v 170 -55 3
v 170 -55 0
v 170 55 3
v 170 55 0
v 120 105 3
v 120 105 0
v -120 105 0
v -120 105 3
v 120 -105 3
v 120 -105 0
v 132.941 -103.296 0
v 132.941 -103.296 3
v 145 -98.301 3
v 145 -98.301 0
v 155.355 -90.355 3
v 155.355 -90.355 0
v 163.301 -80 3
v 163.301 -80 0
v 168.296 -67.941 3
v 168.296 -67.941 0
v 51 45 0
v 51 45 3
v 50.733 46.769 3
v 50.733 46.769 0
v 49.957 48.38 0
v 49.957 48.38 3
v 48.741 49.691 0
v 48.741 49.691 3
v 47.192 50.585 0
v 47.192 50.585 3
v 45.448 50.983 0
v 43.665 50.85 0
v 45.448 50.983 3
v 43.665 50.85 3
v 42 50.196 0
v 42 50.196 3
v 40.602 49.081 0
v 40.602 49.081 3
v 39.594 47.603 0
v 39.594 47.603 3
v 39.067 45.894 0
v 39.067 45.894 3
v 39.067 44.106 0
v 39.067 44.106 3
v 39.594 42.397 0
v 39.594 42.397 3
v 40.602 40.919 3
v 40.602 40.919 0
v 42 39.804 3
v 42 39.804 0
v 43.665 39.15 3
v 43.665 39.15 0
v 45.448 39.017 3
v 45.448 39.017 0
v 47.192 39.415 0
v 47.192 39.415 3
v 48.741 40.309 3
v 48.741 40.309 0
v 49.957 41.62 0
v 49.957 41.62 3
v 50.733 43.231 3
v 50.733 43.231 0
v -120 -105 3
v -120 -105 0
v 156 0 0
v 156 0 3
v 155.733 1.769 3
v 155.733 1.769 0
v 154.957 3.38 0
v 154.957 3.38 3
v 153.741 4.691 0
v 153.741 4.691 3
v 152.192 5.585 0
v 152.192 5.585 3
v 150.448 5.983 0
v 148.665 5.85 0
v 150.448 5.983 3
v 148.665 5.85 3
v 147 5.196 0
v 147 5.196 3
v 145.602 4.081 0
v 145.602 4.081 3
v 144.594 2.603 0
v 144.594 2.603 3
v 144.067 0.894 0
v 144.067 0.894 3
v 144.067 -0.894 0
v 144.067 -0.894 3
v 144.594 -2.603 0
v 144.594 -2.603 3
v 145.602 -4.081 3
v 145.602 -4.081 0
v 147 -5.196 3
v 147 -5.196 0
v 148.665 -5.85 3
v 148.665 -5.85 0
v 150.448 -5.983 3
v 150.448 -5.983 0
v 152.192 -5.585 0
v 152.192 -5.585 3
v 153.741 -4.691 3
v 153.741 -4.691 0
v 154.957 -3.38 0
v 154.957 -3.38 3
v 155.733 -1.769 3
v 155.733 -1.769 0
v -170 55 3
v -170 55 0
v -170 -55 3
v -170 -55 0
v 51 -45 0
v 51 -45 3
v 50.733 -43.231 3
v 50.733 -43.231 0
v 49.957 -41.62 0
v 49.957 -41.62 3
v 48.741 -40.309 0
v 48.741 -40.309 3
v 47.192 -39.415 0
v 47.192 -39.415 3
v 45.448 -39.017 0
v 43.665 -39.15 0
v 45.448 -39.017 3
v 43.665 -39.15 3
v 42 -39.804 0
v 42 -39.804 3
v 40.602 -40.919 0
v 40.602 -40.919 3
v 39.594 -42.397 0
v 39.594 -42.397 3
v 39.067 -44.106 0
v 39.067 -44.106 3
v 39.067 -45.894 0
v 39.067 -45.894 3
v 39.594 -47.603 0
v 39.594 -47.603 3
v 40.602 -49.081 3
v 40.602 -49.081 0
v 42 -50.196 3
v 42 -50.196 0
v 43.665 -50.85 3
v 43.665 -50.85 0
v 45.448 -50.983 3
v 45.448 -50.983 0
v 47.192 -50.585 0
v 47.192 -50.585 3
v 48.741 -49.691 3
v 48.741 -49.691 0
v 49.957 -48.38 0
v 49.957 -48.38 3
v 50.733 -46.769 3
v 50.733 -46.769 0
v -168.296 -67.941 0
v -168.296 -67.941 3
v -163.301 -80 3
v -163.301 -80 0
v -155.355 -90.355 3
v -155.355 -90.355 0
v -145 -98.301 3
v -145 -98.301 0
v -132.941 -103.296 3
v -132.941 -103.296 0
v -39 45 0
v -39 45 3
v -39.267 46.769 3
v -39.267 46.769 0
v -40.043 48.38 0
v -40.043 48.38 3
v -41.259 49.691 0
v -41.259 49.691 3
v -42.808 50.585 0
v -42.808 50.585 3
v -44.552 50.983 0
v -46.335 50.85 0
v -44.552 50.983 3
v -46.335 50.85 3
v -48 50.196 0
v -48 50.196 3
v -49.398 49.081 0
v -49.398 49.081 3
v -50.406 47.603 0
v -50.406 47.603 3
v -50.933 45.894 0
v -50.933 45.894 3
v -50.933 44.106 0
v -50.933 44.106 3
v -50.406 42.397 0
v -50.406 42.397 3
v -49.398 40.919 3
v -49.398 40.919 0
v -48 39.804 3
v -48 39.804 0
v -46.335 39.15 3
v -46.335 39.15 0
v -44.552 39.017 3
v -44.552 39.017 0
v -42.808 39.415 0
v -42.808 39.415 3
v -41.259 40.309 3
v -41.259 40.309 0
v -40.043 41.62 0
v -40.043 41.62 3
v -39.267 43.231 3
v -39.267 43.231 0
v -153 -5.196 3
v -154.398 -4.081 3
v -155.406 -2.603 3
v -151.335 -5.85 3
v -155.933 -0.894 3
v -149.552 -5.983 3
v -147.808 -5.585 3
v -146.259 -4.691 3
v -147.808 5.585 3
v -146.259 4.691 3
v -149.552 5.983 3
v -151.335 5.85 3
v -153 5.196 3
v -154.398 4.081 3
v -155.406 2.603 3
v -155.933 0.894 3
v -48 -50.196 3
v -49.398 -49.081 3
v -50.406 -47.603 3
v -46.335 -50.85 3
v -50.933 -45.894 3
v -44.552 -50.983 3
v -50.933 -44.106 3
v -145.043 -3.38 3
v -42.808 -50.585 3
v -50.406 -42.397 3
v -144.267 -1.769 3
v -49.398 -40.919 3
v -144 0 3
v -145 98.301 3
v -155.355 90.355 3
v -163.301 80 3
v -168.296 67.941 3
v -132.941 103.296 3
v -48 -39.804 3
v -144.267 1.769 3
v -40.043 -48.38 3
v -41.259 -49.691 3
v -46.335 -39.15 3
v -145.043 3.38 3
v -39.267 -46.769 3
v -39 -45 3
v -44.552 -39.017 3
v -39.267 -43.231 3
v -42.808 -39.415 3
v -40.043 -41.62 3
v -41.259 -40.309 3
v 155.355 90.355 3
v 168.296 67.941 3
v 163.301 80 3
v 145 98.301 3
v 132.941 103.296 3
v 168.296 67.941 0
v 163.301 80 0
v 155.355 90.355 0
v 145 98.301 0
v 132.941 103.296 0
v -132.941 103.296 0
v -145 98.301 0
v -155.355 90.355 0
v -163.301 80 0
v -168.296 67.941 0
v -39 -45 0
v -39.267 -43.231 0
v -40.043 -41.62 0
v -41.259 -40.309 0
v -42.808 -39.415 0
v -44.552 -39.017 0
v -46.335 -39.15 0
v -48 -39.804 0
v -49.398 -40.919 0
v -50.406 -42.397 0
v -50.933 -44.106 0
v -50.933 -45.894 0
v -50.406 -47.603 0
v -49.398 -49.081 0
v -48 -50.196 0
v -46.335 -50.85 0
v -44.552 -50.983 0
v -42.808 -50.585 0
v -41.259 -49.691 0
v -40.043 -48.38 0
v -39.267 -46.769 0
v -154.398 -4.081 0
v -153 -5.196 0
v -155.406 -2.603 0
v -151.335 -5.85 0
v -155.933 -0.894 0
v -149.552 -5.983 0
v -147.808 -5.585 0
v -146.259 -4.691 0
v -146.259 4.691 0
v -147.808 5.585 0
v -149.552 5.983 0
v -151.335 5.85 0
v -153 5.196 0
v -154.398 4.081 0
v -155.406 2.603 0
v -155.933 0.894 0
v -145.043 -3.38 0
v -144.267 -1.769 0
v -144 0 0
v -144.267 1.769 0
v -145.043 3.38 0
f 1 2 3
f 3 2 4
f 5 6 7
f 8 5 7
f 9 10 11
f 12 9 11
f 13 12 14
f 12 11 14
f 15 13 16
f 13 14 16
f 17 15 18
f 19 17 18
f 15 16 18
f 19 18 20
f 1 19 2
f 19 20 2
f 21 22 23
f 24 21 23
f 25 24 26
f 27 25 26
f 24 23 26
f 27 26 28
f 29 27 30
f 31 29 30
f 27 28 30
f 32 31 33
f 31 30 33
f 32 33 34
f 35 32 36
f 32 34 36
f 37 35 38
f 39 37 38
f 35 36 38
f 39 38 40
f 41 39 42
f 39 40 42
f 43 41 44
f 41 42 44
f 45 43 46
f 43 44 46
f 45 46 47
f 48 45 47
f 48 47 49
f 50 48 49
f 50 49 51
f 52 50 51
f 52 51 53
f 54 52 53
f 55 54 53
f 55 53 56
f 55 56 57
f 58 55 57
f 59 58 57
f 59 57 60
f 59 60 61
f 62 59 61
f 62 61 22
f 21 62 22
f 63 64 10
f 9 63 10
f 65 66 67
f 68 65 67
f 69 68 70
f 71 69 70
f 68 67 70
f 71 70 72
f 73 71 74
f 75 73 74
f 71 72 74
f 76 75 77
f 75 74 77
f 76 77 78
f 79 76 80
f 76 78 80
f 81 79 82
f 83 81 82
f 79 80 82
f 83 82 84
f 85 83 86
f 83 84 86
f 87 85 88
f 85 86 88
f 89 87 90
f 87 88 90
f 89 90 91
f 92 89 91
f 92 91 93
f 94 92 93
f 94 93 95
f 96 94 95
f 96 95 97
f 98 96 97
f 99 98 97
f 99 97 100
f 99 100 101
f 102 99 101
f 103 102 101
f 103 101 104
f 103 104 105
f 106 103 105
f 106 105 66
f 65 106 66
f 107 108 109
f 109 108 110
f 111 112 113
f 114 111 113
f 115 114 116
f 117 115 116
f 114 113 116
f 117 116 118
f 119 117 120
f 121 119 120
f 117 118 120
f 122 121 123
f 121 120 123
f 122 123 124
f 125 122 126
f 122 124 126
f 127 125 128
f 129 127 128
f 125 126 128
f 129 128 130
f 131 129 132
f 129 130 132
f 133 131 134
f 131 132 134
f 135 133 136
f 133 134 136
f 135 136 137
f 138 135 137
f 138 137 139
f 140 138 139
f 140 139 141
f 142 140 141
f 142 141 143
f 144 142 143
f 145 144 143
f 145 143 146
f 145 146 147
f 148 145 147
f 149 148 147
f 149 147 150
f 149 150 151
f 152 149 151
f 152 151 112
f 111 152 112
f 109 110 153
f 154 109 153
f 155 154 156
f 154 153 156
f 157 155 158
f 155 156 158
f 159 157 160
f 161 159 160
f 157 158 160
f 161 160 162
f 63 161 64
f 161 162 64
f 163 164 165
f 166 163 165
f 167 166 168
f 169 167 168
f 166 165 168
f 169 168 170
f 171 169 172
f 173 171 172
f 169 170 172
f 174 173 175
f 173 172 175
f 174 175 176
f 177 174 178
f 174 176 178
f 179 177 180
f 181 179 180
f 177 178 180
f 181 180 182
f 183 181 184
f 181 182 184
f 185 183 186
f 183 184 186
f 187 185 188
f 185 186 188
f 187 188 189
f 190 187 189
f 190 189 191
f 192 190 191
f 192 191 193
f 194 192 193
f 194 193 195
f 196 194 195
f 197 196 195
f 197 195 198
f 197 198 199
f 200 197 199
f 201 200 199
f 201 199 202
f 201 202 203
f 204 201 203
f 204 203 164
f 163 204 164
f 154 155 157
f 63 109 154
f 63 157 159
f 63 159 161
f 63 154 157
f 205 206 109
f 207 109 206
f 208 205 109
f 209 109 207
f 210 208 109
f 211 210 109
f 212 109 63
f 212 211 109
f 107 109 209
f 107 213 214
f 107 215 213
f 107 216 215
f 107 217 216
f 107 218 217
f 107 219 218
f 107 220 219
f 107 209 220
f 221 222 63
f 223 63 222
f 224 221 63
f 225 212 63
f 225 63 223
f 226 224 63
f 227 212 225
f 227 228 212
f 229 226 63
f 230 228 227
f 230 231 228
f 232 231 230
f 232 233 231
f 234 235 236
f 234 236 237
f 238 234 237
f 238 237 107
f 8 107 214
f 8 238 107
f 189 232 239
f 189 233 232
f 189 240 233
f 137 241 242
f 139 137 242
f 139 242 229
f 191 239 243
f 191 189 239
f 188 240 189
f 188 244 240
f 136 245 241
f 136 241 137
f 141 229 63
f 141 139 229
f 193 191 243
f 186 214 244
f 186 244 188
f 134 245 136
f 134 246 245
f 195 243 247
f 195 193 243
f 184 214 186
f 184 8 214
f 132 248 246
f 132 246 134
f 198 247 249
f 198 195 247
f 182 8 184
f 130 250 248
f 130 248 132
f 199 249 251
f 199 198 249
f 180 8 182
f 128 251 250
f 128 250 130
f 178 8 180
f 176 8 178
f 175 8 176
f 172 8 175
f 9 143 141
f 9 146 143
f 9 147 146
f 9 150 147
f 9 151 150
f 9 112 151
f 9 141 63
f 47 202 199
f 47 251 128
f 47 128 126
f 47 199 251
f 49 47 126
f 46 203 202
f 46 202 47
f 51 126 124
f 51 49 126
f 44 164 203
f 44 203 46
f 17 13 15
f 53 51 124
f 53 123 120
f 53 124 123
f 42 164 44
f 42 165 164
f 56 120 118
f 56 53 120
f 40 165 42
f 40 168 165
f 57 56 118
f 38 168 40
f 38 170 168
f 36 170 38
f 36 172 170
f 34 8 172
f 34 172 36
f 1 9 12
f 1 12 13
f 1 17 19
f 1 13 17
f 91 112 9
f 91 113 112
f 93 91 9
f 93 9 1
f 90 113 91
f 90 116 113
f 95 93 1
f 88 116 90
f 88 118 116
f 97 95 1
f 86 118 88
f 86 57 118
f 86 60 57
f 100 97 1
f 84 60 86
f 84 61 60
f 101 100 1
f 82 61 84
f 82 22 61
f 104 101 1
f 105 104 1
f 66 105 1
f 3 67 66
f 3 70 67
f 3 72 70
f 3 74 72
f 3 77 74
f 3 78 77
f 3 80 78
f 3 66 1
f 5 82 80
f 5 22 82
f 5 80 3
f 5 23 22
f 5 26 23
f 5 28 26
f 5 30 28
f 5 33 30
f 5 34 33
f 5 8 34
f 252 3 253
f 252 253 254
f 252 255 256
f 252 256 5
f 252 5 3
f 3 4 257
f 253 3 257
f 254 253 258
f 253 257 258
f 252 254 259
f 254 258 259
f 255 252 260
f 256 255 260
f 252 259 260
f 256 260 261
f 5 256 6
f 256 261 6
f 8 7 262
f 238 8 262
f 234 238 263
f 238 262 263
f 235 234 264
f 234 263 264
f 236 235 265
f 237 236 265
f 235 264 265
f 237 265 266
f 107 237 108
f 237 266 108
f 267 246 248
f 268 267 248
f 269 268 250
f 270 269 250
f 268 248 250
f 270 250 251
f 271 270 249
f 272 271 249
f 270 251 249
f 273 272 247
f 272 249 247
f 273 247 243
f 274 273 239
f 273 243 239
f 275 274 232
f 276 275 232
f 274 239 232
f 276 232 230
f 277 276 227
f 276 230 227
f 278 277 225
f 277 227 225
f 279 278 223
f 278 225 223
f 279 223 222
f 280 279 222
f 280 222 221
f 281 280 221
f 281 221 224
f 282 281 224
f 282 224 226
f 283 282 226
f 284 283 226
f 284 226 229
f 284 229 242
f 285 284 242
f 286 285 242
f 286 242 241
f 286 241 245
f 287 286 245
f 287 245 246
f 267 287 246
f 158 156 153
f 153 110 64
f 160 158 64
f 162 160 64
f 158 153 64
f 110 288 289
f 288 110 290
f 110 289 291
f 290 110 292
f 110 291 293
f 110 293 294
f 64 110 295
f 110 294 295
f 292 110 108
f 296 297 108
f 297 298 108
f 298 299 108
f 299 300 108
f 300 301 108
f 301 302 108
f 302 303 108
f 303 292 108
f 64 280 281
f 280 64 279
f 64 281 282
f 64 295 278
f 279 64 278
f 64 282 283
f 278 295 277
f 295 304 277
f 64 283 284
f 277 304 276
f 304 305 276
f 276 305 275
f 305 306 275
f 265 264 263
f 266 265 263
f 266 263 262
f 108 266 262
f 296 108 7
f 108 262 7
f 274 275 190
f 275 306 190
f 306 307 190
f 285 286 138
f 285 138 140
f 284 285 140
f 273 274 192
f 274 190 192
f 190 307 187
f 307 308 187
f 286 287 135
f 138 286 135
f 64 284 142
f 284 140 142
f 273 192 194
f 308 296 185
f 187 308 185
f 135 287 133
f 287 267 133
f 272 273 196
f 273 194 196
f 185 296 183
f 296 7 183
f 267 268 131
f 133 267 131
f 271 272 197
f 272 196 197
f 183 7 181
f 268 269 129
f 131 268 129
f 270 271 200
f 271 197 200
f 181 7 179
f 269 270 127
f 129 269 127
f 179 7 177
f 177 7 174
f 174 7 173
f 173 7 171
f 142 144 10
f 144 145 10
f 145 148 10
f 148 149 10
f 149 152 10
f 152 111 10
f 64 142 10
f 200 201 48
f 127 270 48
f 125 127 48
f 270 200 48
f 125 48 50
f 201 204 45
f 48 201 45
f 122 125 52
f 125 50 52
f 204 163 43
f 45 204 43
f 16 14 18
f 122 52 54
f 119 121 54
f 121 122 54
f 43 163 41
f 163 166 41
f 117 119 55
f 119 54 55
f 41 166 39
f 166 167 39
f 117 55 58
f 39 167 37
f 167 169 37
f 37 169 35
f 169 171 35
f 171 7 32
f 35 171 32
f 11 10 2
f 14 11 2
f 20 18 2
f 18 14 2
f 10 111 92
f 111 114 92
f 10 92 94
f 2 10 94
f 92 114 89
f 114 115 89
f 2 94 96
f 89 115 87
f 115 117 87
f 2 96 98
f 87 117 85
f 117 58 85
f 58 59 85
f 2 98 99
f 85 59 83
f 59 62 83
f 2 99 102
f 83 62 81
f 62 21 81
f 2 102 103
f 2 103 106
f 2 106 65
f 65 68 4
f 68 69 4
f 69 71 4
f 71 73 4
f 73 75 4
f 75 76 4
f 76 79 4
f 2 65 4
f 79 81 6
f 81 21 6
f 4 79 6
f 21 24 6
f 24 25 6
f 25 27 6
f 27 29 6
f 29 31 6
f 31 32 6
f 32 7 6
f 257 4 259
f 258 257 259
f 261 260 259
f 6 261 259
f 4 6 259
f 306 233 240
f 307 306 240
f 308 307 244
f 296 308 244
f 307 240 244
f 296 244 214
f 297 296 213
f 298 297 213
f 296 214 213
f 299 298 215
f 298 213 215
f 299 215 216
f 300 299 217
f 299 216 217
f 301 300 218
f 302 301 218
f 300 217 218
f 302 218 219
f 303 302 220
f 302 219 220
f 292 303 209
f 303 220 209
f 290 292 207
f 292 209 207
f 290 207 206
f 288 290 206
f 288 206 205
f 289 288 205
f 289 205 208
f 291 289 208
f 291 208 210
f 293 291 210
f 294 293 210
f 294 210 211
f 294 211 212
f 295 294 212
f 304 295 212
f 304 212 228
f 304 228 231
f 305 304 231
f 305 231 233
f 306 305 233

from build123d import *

# Parameters (mm, degrees)
DODANIE_WYCI_GNI_CIE1_DEPTH = 3
OTWORY_USTALAJ_CE_12_0MM1_D = 12


with BuildPart() as part:
    # Szkic1 → Dodanie-wyciągnięcie1 (new body)
    with BuildSketch(Plane.XY):
        with BuildLine():
            Line((-120, -105), (120, -105))
            ThreePointArc((120, -105), (155.355339059, -90.355339059), (170, -55))
            Line((170, -55), (170, 55))
            ThreePointArc((170, 55), (155.355339059, 90.355339059), (120, 105))
            Line((120, 105), (-120, 105))
            ThreePointArc((-120, 105), (-155.355339059, 90.355339059), (-170, 55))
            Line((-170, 55), (-170, -55))
            ThreePointArc((-170, -55), (-155.355339059, -90.355339059), (-120, -105))
        make_face()
    extrude(amount=DODANIE_WYCI_GNI_CIE1_DEPTH)

    # Otwory ustalające Ø12.0mm1 (through all)
    with Locations(Plane(origin=(0, 0, 0), x_dir=(-1, 0, 0), z_dir=(0, 0, -1))):
        with Locations((45, 45), (-45, 45), (45, -45), (-45, -45), (-150, 0), (150, 0)):
            Hole(OTWORY_USTALAJ_CE_12_0MM1_D / 2)


solid = part.part
